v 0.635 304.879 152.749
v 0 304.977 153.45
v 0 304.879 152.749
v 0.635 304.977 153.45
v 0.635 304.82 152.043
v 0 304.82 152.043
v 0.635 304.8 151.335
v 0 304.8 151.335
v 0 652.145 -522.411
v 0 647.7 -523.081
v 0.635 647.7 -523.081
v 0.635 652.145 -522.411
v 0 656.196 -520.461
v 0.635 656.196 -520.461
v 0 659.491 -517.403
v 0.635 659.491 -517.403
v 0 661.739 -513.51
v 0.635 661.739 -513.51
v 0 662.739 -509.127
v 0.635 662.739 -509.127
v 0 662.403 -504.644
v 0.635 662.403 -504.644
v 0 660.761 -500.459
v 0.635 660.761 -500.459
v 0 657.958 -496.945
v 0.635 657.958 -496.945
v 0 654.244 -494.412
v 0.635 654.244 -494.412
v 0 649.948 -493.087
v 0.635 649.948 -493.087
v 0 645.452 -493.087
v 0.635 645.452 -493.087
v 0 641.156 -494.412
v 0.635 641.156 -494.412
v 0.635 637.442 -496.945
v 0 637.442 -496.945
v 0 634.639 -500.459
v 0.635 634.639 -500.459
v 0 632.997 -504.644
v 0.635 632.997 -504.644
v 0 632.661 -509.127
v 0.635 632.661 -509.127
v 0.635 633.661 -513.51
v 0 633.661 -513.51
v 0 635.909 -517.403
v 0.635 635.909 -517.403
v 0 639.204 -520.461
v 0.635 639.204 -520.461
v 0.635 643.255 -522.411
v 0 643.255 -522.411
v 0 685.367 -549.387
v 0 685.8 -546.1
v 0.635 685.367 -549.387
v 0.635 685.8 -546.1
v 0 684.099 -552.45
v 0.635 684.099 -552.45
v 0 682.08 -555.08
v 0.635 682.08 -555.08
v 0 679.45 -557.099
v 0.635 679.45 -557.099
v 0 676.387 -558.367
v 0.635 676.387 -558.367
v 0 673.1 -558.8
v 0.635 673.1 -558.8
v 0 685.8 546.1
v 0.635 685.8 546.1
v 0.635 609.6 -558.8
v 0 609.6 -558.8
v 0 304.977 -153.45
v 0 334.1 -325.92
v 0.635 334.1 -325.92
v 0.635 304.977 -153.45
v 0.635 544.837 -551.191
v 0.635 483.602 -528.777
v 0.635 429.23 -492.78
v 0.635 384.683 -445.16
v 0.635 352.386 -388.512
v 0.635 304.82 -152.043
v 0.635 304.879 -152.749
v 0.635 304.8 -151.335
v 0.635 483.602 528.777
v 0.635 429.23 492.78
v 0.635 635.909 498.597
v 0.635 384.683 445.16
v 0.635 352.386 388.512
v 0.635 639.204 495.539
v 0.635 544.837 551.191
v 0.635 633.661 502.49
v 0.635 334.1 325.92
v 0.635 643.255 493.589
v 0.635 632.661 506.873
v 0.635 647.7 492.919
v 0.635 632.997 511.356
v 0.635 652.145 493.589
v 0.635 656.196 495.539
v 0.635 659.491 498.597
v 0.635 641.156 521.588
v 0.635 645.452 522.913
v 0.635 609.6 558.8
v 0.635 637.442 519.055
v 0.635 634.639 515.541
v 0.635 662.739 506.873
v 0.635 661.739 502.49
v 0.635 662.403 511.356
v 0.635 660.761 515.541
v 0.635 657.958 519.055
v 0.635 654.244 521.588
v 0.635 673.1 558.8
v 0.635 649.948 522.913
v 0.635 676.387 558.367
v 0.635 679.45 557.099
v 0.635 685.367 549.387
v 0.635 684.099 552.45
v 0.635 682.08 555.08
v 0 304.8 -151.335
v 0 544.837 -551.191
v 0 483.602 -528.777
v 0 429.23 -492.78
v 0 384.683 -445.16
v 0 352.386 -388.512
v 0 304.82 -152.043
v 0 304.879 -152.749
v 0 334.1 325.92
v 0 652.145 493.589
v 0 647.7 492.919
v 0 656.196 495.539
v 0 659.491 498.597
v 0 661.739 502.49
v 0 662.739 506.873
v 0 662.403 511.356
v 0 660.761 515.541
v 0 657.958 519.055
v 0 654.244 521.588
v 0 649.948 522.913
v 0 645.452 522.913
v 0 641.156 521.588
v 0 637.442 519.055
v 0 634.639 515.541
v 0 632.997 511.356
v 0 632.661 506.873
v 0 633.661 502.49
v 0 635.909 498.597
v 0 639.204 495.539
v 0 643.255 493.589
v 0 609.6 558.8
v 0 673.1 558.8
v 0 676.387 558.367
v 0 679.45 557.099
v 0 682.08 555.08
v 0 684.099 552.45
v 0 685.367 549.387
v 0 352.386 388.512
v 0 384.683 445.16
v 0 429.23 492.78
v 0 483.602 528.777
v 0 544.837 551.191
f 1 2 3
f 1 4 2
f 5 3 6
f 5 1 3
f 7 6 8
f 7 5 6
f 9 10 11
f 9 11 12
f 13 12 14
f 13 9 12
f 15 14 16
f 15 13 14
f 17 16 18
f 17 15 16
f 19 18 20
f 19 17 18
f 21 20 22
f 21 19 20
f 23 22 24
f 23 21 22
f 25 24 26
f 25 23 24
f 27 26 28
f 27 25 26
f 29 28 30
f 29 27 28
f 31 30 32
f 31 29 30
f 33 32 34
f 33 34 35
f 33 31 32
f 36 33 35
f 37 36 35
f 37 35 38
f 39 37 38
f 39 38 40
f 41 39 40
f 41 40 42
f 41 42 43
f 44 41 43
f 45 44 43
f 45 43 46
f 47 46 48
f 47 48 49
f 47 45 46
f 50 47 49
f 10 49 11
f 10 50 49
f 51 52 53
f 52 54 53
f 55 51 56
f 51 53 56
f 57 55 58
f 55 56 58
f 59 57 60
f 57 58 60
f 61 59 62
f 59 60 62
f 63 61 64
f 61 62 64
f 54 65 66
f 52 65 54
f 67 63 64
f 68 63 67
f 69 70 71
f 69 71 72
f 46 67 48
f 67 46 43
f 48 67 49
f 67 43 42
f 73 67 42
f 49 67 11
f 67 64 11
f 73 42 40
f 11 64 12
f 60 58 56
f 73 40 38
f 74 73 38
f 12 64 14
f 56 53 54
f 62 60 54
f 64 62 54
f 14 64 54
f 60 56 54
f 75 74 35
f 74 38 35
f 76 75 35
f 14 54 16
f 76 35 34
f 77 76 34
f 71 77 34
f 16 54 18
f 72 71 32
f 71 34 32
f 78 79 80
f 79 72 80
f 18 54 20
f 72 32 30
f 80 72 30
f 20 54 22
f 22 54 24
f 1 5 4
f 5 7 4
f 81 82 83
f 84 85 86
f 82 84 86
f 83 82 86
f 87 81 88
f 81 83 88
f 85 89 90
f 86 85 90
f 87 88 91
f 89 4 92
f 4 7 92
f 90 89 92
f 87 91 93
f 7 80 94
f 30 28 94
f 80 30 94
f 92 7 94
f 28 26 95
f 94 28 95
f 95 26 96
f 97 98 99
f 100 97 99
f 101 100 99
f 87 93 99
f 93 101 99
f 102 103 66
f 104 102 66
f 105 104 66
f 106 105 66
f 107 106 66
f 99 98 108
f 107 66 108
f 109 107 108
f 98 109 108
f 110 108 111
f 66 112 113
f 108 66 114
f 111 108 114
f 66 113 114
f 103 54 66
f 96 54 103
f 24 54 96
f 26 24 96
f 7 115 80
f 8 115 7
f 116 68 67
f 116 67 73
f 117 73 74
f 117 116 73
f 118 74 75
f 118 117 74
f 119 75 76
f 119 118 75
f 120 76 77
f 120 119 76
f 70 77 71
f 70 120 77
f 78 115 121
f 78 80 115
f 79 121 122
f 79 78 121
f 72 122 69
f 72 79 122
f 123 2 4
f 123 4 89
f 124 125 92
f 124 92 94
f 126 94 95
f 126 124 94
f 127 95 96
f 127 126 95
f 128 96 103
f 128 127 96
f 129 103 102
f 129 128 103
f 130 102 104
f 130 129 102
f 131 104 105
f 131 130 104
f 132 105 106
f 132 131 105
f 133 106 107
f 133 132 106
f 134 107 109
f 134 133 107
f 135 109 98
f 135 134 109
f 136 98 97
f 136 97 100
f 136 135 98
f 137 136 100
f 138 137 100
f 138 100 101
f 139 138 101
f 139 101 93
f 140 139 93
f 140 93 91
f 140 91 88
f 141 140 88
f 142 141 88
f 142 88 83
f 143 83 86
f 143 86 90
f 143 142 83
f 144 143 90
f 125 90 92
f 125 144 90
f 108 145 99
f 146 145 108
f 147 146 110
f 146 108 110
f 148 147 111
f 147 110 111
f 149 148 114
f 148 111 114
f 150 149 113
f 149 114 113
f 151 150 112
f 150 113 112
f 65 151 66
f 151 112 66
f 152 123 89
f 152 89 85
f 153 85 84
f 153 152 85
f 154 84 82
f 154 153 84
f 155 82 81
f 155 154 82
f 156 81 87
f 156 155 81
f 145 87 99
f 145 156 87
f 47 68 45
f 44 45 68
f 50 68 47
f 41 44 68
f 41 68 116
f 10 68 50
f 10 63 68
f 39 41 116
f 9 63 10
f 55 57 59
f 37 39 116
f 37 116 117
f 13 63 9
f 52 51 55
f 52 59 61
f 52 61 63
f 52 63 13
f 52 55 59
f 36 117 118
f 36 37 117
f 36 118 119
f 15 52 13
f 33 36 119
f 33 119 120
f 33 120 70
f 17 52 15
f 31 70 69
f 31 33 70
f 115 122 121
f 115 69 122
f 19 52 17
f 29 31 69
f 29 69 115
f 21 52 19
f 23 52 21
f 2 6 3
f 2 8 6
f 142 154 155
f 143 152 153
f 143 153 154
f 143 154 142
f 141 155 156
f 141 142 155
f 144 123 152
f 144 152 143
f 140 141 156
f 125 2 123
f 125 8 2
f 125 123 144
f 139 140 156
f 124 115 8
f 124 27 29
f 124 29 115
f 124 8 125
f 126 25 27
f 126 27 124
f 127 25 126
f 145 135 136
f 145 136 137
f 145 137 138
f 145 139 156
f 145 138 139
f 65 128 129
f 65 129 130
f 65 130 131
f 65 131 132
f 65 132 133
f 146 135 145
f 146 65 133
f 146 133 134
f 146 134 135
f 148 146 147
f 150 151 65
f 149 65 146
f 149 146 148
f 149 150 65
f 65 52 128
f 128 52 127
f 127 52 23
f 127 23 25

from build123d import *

# Parameters (mm, degrees)
SKETCH1_R           = 15.08125
BOSS_EXTRUDE1_DEPTH = 0.635
FILLET1_R           = 12.7


with BuildPart() as part:
    # Sketch1 → Boss-Extrude1 (new body)
    with BuildSketch(Plane(origin=(0, 0, 0), x_dir=(0, 0, -1), z_dir=(1, 0, 0))):
        with BuildLine():
            Line((-558.8, 609.6), (-558.8, 685.8))
            Line((-558.8, 685.8), (558.8, 685.8))
            Line((558.8, 685.8), (558.8, 609.6))
            ThreePointArc((558.8, 609.6), (492.779998657, 429.230002015), (325.91999876, 334.100000517))
            Line((325.91999876, 334.100000517), (152.4, 304.8))
            Line((152.4, 304.8), (-152.4, 304.8))
            Line((-152.4, 304.8), (-325.91999876, 334.100000517))
            ThreePointArc((-325.91999876, 334.100000517), (-492.779998657, 429.230002015), (-558.8, 609.6))
        make_face()
        with Locations((-508, 647.7)):
            Circle(SKETCH1_R, mode=Mode.SUBTRACT)
        with Locations((508, 647.7)):
            Circle(SKETCH1_R, mode=Mode.SUBTRACT)
    extrude(amount=BOSS_EXTRUDE1_DEPTH)

    # Fillet1
    fillet1_edges = [part.edges().sort_by_distance(p)[0] for p in [
        (0.3175, 304.8, -152.4),
        (0.3175, 304.8, 152.4),
        (0.3175, 685.8, 558.8),
        (0.3175, 685.8, -558.8),
    ]]
    fillet(fillet1_edges, radius=FILLET1_R)


solid = part.part
